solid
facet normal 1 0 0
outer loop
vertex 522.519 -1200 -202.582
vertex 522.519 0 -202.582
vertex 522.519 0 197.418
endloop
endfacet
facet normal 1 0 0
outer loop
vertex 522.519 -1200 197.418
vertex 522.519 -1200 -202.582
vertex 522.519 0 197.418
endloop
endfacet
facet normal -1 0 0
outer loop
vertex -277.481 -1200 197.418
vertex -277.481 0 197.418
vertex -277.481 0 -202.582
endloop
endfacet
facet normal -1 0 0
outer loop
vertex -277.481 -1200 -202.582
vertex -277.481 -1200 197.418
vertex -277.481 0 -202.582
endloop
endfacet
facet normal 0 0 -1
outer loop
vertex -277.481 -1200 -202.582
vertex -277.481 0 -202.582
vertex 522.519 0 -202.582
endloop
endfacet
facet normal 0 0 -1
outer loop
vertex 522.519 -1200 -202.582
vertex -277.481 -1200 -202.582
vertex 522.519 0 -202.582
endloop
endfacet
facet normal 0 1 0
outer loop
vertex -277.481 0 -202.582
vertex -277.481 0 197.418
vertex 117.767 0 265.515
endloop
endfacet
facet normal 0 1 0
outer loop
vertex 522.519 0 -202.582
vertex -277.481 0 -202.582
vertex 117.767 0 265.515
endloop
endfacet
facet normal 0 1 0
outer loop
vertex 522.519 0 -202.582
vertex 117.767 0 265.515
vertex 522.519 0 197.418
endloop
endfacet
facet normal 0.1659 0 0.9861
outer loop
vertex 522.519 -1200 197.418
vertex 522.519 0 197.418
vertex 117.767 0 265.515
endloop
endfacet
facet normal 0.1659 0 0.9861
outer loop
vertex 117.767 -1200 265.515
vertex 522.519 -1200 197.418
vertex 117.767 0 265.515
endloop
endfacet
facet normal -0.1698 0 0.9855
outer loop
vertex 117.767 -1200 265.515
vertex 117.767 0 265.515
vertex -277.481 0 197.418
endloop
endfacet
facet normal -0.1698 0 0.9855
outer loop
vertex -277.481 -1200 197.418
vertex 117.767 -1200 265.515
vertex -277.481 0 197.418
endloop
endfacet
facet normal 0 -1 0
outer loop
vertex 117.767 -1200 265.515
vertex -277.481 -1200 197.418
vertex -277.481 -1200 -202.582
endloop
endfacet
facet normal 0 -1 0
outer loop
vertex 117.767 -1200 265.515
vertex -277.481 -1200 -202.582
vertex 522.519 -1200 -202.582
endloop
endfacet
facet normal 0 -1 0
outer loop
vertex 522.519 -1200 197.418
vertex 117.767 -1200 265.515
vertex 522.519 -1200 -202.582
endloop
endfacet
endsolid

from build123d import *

# Parameters (mm, degrees)
F1_DEPTH = 1200


with BuildPart() as f1:
    # F0 (on Front) → F1 (new body)
    with BuildSketch(Plane.XZ):
        Polygon((117.767222, 265.515238), (-277.481471, 197.418033), (122.518529, 197.418033), (522.518529, 197.418033), align=None)
        Polygon((122.518529, 197.418033), (-277.481471, 197.418033), (-277.481471, -202.581967), (522.518529, -202.581967), (522.518529, 197.418033), align=None)
    extrude(amount=F1_DEPTH)


solid = f1.part
